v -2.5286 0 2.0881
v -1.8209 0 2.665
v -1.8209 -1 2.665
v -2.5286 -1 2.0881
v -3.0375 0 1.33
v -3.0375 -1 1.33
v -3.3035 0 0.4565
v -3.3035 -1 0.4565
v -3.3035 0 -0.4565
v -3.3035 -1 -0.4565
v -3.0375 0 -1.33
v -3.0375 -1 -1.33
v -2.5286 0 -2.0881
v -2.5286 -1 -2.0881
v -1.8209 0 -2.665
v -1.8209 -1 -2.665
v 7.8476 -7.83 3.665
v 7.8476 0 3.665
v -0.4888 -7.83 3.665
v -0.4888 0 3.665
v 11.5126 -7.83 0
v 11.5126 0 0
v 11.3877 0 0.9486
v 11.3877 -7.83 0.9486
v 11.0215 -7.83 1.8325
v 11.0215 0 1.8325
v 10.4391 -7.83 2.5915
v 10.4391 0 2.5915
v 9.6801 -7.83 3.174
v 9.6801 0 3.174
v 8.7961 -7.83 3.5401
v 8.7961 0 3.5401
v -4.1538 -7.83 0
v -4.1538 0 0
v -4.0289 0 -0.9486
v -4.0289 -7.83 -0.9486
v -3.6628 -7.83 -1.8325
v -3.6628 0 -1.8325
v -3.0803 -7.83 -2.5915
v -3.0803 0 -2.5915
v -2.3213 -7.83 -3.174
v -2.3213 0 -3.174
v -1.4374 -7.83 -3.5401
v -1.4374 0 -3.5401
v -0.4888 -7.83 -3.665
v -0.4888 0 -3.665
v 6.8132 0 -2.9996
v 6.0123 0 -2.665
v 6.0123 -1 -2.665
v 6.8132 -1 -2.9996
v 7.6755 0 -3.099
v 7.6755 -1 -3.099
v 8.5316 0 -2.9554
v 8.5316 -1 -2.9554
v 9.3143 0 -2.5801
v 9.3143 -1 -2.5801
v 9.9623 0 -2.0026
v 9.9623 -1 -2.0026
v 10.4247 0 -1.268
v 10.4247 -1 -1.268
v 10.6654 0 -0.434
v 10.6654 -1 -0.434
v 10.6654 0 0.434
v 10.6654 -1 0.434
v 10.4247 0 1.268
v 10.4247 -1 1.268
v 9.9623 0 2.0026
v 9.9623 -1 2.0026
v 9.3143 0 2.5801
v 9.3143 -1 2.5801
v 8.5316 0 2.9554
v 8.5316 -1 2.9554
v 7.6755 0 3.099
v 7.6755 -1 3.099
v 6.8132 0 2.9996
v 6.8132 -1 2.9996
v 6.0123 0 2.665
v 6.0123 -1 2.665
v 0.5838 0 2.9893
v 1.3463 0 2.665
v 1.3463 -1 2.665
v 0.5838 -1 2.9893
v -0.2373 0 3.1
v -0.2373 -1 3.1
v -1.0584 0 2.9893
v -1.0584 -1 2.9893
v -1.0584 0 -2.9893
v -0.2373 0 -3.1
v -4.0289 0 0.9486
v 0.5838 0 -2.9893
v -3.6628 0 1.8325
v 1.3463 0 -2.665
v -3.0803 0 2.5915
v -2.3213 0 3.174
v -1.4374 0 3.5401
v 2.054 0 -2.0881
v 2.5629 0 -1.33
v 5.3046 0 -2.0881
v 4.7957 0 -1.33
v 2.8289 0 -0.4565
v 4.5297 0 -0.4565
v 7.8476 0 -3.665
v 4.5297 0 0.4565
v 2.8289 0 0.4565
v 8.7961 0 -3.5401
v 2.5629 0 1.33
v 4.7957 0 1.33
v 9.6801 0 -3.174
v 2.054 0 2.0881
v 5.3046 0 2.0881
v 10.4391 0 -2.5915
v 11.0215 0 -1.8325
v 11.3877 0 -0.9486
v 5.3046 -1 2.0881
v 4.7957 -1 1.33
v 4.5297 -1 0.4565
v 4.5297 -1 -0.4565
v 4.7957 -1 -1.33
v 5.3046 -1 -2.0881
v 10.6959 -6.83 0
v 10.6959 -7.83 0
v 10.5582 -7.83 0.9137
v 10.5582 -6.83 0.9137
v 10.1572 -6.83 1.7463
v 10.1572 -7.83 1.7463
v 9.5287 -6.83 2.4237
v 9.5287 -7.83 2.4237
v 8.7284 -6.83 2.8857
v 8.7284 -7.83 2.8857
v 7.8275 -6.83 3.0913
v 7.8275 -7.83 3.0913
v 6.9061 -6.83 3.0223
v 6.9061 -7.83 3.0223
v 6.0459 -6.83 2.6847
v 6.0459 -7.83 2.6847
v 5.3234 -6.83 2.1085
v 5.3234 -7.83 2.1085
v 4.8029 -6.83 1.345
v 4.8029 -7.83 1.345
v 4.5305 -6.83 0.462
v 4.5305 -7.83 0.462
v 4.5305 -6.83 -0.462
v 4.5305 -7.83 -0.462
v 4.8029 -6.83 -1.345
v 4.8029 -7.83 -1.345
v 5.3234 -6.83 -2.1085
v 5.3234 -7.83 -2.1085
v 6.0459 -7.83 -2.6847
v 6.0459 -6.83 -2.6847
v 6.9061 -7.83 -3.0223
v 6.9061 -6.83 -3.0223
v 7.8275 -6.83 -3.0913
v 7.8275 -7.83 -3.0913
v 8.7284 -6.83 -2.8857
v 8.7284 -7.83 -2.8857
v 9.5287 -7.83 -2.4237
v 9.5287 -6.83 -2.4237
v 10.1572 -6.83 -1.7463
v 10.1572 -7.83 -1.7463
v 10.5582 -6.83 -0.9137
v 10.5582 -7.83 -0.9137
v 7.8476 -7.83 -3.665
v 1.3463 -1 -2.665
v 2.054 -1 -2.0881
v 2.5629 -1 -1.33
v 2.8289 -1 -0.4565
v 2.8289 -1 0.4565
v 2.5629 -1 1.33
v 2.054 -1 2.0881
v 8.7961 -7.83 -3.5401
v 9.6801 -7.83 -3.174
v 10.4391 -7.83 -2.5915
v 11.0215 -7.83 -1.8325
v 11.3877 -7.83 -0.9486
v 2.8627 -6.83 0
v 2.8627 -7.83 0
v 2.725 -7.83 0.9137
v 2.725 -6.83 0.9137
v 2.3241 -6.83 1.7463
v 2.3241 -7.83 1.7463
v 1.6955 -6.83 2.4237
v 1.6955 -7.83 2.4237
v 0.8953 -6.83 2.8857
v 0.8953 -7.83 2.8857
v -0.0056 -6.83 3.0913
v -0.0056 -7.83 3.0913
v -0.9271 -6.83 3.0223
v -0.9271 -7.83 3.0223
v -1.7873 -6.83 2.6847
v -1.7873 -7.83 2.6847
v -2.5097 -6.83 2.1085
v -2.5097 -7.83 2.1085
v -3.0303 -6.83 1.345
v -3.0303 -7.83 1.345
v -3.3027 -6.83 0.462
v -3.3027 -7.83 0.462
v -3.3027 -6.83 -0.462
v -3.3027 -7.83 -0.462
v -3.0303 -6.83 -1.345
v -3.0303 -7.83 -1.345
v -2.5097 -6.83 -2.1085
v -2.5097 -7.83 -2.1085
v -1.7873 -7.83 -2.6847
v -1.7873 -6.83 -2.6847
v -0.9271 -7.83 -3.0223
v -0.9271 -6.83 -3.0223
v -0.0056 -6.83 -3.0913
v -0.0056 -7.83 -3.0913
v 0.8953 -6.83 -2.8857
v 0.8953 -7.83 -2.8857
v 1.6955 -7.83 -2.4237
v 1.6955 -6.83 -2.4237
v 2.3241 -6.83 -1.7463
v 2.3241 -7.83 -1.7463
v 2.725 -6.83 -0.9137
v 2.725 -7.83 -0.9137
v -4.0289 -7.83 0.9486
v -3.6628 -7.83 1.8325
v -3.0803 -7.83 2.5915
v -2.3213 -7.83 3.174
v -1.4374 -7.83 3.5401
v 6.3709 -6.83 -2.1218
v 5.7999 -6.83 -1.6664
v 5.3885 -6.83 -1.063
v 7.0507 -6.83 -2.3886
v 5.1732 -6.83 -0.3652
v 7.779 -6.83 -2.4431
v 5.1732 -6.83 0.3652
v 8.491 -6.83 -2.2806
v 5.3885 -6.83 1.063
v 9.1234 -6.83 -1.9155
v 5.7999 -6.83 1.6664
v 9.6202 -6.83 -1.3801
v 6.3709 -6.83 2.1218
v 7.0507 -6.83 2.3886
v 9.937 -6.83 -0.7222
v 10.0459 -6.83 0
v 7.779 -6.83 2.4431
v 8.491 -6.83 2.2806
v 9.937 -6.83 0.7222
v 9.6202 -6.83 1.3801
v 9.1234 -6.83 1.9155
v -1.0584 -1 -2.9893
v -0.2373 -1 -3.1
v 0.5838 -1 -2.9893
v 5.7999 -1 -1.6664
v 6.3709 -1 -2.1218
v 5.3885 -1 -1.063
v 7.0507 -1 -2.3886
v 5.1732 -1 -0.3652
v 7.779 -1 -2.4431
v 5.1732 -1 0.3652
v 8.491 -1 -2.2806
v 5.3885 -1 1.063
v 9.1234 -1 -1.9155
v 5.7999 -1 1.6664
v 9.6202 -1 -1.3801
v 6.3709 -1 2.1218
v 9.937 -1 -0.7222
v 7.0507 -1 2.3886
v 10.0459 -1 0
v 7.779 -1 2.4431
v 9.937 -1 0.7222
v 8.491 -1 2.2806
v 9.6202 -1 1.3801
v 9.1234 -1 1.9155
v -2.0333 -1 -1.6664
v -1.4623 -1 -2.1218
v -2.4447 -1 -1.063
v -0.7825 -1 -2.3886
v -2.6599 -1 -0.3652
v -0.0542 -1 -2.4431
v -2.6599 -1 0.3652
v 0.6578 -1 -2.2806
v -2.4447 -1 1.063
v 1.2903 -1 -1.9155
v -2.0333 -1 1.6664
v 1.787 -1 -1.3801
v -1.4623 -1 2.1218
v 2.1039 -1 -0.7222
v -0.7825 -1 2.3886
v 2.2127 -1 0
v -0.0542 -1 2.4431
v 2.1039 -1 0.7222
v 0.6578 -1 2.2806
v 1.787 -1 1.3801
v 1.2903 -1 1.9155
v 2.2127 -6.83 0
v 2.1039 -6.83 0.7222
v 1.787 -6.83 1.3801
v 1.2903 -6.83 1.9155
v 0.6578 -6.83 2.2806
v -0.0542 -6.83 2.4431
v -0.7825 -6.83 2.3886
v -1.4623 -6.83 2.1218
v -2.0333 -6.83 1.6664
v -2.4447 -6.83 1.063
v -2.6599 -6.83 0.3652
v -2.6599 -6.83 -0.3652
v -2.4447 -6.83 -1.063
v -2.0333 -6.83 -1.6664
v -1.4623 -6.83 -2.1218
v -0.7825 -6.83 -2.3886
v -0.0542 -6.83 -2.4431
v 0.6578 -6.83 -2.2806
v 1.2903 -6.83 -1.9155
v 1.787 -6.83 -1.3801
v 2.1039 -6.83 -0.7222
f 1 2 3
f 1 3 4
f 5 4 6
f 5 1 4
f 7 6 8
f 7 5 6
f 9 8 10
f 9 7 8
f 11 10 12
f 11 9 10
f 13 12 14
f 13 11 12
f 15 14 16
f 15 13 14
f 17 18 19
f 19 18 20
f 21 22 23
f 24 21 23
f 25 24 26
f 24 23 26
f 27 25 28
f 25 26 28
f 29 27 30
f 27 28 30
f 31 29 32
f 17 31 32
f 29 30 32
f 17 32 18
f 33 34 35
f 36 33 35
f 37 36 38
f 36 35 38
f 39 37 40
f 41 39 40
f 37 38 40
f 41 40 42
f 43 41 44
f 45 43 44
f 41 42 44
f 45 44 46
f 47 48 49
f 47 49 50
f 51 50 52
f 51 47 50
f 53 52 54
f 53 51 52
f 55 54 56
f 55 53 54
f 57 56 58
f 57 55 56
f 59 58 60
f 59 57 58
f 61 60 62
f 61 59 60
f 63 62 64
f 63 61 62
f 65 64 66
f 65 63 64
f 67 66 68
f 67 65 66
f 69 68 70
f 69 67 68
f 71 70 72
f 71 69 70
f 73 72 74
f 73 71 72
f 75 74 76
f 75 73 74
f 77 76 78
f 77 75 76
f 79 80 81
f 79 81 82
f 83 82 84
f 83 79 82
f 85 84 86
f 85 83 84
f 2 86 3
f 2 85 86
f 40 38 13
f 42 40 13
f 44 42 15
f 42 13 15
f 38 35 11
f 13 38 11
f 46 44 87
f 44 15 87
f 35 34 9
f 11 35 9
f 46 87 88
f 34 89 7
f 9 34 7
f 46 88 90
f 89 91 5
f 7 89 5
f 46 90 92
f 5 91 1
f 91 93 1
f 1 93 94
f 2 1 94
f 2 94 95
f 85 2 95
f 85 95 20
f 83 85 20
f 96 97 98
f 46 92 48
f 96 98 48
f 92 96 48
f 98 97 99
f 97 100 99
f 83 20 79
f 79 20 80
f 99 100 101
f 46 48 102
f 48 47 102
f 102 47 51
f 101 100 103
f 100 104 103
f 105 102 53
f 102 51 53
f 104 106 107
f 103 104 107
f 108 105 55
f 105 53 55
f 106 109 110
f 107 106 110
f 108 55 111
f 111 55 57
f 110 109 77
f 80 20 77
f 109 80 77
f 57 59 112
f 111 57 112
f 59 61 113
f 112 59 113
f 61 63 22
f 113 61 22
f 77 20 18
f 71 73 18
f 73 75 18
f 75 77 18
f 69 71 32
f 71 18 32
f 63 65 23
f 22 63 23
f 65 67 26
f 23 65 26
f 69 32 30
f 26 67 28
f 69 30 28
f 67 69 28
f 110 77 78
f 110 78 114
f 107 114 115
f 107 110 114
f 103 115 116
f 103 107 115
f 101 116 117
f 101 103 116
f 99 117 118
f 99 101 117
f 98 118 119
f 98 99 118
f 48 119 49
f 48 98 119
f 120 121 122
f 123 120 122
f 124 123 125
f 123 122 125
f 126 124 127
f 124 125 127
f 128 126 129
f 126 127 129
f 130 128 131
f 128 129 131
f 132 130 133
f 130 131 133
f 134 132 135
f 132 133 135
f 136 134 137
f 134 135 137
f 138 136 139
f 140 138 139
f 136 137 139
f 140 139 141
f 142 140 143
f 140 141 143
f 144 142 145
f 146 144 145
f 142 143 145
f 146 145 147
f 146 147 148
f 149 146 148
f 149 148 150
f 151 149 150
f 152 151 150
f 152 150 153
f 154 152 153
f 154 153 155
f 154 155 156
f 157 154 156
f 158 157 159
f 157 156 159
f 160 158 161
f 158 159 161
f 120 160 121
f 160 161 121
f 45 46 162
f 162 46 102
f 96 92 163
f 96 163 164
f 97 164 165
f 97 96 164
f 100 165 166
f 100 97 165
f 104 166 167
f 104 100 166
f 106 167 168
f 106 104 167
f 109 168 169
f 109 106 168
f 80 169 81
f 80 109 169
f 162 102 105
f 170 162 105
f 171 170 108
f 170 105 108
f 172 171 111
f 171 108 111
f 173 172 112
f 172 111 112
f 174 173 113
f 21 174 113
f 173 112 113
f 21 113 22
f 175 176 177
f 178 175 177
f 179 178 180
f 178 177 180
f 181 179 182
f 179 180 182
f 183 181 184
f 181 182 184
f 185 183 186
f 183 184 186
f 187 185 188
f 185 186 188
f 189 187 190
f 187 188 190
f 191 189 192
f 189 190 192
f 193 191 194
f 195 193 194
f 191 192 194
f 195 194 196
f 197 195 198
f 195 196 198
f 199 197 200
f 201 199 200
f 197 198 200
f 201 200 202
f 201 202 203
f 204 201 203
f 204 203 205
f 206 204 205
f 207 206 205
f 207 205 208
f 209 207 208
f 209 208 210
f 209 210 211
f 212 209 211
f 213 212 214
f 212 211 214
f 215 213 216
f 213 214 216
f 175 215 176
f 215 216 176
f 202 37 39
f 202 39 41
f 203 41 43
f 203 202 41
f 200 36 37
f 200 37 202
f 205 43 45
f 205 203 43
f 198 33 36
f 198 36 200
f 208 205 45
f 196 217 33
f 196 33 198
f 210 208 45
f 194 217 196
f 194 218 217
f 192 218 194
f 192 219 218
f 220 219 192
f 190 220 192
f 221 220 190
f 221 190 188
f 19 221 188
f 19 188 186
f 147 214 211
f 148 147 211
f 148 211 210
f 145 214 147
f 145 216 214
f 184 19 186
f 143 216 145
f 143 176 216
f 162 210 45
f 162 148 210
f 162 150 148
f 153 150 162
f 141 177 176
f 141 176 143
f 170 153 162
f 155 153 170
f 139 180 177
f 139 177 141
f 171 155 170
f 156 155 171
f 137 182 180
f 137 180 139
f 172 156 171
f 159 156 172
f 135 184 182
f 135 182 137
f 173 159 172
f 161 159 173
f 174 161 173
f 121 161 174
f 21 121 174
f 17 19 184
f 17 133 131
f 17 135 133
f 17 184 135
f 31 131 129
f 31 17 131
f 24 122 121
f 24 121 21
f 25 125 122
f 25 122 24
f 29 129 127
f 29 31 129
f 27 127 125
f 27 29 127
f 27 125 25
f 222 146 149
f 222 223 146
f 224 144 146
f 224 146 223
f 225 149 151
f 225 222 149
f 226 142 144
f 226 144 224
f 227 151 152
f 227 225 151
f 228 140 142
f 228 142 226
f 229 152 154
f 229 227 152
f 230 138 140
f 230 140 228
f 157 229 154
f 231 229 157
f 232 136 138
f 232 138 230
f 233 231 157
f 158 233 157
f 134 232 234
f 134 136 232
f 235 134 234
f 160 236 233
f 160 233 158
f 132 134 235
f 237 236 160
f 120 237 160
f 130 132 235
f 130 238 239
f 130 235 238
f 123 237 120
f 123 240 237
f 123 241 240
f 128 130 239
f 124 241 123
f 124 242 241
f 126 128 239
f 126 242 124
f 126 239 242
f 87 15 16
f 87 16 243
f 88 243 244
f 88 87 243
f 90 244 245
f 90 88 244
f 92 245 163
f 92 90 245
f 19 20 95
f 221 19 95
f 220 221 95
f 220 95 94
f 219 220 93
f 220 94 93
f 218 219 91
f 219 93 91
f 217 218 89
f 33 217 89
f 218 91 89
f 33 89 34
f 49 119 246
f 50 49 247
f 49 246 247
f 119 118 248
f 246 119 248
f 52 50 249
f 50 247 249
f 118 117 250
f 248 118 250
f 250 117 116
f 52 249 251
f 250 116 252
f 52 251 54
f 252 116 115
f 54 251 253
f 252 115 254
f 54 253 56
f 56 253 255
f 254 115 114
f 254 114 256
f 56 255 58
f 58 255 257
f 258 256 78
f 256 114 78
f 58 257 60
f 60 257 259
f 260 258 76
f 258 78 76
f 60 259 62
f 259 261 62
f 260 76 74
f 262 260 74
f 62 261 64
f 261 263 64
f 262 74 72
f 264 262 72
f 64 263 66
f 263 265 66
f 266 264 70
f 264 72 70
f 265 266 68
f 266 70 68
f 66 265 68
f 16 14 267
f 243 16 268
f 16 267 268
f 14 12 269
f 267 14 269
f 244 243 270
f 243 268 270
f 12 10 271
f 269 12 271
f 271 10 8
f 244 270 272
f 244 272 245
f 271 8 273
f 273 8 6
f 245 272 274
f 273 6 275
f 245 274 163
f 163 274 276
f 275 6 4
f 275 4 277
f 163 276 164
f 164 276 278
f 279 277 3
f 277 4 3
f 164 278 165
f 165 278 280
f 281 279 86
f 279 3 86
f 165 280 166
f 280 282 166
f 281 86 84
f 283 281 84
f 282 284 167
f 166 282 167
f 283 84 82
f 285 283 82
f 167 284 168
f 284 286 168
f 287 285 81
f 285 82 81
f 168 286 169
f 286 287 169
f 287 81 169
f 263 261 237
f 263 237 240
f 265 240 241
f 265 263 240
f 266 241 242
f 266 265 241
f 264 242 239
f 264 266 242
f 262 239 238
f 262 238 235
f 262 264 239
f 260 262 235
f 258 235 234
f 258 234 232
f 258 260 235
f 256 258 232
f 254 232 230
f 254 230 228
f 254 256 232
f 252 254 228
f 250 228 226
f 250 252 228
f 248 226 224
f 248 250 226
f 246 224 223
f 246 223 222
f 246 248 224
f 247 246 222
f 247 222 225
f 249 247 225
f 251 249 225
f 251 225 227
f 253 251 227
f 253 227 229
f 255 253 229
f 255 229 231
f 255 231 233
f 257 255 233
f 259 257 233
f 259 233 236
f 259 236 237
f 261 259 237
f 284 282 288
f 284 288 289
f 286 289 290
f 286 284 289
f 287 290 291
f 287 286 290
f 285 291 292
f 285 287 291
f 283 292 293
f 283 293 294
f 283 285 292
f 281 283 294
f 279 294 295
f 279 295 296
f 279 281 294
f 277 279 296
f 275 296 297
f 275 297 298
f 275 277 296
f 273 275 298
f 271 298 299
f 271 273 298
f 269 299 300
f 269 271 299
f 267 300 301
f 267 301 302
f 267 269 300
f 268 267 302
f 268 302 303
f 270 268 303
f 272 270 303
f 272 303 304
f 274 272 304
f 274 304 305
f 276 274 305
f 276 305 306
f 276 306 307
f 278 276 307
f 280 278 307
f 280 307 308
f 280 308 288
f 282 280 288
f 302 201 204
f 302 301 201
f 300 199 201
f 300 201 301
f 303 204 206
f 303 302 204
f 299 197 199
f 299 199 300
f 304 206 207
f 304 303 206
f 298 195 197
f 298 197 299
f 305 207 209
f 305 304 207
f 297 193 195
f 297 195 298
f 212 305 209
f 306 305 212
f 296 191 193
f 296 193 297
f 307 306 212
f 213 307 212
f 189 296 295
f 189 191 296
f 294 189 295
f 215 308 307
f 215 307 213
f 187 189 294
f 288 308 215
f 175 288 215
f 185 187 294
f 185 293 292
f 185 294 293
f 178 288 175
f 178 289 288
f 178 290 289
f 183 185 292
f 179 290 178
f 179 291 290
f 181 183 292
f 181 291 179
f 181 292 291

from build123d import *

# Parameters (mm, degrees)
F0_R     = 2.45
F1_DEPTH = 7.83
F2_DEPTH = 1
F3_R     = 3.1
F3_R_2   = 2.45
F4_DEPTH = 1


with BuildPart() as f1:
    # F0 (on Front) → F1 (new body)
    with BuildSketch(Plane.XZ):
        with BuildLine():
            ThreePointArc((-4.1537828283, 0), (-3.0803291813, -2.591546353), (-0.4887828283, -3.665))
            Line((-0.4887828283, -3.665), (7.8475505051, -3.665))
            ThreePointArc((7.8475505051, -3.665), (10.4390968581, -2.591546353), (11.5125505051, 0))
            ThreePointArc((11.5125505051, 0), (10.4390968581, 2.591546353), (7.8475505051, 3.665))
            Line((7.8475505051, 3.665), (3.6792171717, 3.665))
            Line((3.6792171717, 3.665), (-0.4887828283, 3.665))
            ThreePointArc((-0.4887828283, 3.665), (-3.0803291813, 2.591546353), (-4.1537828283, 0))
        make_face()
        with BuildLine():
            ThreePointArc((-1.8208784206, -2.665), (-3.3372828283, 0), (-1.8208784206, 2.665))
            ThreePointArc((-1.8208784206, 2.665), (-0.2372828283, 3.1), (1.346312764, 2.665))
            ThreePointArc((1.346312764, 2.665), (2.8627171717, 0), (1.346312764, -2.665))
            ThreePointArc((1.346312764, -2.665), (-0.2372828283, -3.1), (-1.8208784206, -2.665))
        make_face(mode=Mode.SUBTRACT)
        with BuildLine():
            ThreePointArc((6.0122882461, -2.665), (4.4958838384, 0), (6.0122882461, 2.665))
            ThreePointArc((6.0122882461, 2.665), (10.6958838384, 0), (6.0122882461, -2.665))
        make_face(mode=Mode.SUBTRACT)
        with BuildLine():
            ThreePointArc((1.346312764, 2.665), (-0.2372828283, 3.1), (-1.8208784206, 2.665))
            ThreePointArc((-1.8208784206, 2.665), (-3.3372828283, 0), (-1.8208784206, -2.665))
            ThreePointArc((-1.8208784206, -2.665), (-0.2372828283, -3.1), (1.346312764, -2.665))
            ThreePointArc((1.346312764, -2.665), (2.8627171717, 0), (1.346312764, 2.665))
        make_face()
        with Locations((-0.2372828283, 0)):
            Circle(F0_R, mode=Mode.SUBTRACT)
        with BuildLine():
            ThreePointArc((6.0122882461, -2.665), (10.6958838384, 0), (6.0122882461, 2.665))
            ThreePointArc((6.0122882461, 2.665), (4.4958838384, 0), (6.0122882461, -2.665))
        make_face()
        with Locations((7.5958838384, 0)):
            Circle(F0_R, mode=Mode.SUBTRACT)
    extrude(amount=F1_DEPTH)

    # F0 (on Front) → F2 (cut)
    with BuildSketch(Plane.XZ):
        with BuildLine():
            ThreePointArc((1.346312764, 2.665), (-0.2372828283, 3.1), (-1.8208784206, 2.665))
            ThreePointArc((-1.8208784206, 2.665), (-3.3372828283, 0), (-1.8208784206, -2.665))
            ThreePointArc((-1.8208784206, -2.665), (-0.2372828283, -3.1), (1.346312764, -2.665))
            ThreePointArc((1.346312764, -2.665), (2.8627171717, 0), (1.346312764, 2.665))
        make_face()
        with Locations((-0.2372828283, 0)):
            Circle(F0_R, mode=Mode.SUBTRACT)
        with BuildLine():
            ThreePointArc((6.0122882461, -2.665), (10.6958838384, 0), (6.0122882461, 2.665))
            ThreePointArc((6.0122882461, 2.665), (4.4958838384, 0), (6.0122882461, -2.665))
        make_face()
        with Locations((7.5958838384, 0)):
            Circle(F0_R, mode=Mode.SUBTRACT)
    extrude(amount=F2_DEPTH, mode=Mode.SUBTRACT)

    # F3 (on face) → F4 (cut)
    with BuildSketch(Plane.XZ.offset(7.83)):
        with Locations((-0.2372828283, 0)):
            Circle(F3_R)
        with Locations((-0.2372828283, 0)):
            Circle(F3_R_2, mode=Mode.SUBTRACT)
        with Locations((7.5958838384, 0)):
            Circle(F3_R)
        with Locations((7.5958838384, 0)):
            Circle(F3_R_2, mode=Mode.SUBTRACT)
    extrude(amount=-F4_DEPTH, mode=Mode.SUBTRACT)


solid = f1.part
